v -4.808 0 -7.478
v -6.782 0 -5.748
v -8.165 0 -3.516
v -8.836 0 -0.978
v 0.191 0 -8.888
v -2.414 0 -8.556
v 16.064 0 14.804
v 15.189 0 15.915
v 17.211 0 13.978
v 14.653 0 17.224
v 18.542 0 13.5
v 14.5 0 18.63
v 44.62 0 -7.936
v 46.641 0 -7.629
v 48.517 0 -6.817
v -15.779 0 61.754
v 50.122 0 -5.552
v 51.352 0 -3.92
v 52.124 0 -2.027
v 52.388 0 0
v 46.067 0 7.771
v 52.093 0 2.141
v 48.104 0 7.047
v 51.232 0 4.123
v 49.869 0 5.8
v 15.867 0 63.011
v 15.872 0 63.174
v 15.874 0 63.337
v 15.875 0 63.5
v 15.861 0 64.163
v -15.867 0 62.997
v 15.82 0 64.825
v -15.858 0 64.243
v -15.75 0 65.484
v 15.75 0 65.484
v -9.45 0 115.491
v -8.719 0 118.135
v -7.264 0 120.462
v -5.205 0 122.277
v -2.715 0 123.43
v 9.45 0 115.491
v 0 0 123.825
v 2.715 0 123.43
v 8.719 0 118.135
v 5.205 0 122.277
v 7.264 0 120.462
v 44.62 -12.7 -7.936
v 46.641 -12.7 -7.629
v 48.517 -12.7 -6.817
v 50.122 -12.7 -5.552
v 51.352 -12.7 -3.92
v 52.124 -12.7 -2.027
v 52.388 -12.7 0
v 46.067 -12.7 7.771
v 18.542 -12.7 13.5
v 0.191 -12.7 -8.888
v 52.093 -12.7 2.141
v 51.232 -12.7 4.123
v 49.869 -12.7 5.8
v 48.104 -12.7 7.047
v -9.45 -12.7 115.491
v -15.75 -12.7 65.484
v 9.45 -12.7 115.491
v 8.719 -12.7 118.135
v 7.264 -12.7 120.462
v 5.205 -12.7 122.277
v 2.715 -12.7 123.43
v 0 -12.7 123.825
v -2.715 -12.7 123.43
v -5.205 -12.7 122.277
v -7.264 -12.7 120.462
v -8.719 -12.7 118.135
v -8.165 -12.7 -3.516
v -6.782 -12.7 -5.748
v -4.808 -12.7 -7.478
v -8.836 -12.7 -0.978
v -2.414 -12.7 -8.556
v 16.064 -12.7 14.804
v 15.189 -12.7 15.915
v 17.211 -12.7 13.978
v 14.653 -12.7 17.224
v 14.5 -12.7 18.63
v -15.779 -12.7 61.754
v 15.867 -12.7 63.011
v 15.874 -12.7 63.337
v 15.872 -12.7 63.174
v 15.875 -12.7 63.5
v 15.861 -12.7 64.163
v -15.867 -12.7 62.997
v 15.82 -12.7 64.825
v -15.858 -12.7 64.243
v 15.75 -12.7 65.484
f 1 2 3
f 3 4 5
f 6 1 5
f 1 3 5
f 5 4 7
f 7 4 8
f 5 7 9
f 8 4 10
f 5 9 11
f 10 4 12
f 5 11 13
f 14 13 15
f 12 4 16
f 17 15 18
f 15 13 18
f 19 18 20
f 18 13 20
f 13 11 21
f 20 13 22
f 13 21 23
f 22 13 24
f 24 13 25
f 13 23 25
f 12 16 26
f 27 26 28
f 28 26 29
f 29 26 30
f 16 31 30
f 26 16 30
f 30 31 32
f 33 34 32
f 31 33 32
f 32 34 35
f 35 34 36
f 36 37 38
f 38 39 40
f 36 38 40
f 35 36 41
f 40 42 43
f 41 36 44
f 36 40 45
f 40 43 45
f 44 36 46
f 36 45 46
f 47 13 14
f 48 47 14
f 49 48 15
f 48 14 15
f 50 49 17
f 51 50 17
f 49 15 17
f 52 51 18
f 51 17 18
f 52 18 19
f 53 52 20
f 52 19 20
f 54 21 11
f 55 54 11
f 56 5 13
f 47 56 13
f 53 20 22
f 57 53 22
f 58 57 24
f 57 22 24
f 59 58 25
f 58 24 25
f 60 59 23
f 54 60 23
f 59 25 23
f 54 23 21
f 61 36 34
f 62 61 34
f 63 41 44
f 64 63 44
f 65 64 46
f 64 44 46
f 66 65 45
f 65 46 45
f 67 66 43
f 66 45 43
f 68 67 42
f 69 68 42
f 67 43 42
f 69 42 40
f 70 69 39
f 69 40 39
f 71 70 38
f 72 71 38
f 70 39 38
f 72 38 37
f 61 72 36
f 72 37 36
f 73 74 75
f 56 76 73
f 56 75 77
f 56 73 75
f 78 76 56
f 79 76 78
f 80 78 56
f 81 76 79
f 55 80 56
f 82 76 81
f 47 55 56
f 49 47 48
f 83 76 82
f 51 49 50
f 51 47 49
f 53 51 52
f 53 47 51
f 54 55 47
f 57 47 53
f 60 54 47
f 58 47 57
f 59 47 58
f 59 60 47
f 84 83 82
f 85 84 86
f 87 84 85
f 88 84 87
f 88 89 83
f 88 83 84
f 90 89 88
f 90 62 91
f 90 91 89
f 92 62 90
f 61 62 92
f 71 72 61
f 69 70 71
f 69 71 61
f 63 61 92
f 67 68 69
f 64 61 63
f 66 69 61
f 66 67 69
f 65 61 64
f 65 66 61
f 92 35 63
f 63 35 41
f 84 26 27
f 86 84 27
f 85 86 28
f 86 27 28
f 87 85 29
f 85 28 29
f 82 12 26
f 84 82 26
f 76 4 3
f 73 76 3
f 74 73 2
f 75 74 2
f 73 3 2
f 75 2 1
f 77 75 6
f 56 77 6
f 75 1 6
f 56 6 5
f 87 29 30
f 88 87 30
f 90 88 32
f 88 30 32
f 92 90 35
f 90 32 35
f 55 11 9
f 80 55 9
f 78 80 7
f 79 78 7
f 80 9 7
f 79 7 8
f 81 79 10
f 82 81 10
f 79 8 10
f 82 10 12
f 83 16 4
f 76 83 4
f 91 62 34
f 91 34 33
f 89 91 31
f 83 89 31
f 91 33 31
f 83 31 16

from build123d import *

# Parameters (mm, degrees)
F2_DEPTH = 12.7


with BuildPart() as f2:
    # F0 (on Front) → F2 (new body)
    with BuildSketch(Plane.XZ):
        with BuildLine():
            ThreePointArc((-9.450293, 115.490625), (-0.596483, 104.793695), (9.525, 114.3))
            ThreePointArc((9.525, 114.3), (9.506305, 114.896483), (9.450293, 115.490625))
            ThreePointArc((9.450293, 115.490625), (0, 123.825), (-9.450293, 115.490625))
        make_face()
        with BuildLine():
            ThreePointArc((9.450293, 115.490625), (9.506305, 114.896483), (9.525, 114.3))
            ThreePointArc((9.525, 114.3), (-0.596483, 104.793695), (-9.450293, 115.490625))
            Line((-9.450293, 115.490625), (-15.750488, 65.484375))
            ThreePointArc((-15.750488, 65.484375), (0, 79.375), (15.750488, 65.484375))
            Line((15.750488, 65.484375), (9.450293, 115.490625))
        make_face()
        with BuildLine():
            ThreePointArc((15.875, 63.5), (15.843841, 64.494139), (15.750488, 65.484375))
            ThreePointArc((15.750488, 65.484375), (0, 79.375), (-15.750488, 65.484375))
            ThreePointArc((-15.750488, 65.484375), (-15.874547, 63.619893), (-15.778664, 61.75375))
            ThreePointArc((-15.778664, 61.75375), (0.630191, 47.637513), (15.867467, 63.011))
            ThreePointArc((15.867467, 63.011), (15.873117, 63.255471), (15.875, 63.5))
        make_face()
        with BuildLine():
            ThreePointArc((15.867467, 63.011), (0.630191, 47.637513), (-15.778664, 61.75375))
            Line((-15.778664, 61.75375), (-8.836052, -0.9779))
            ThreePointArc((-8.836052, -0.9779), (-0.489693, 8.876503), (8.89, 0))
            ThreePointArc((8.89, 0), (6.353174, -6.218463), (0.1905, -8.887959))
            Line((0.1905, -8.887959), (44.620089, -7.935677))
            ThreePointArc((44.620089, -7.935677), (36.545983, 0.728304), (46.067357, 7.770976))
            Line((46.067357, 7.770976), (18.542212, 13.499725))
            ThreePointArc((18.542212, 13.499725), (15.587302, 15.328925), (14.499731, 18.62963))
            Line((14.499731, 18.62963), (15.867467, 63.011))
        make_face()
        with BuildLine():
            ThreePointArc((8.89, 0), (-0.489693, 8.876503), (-8.836052, -0.9779))
            ThreePointArc((-8.836052, -0.9779), (-5.859066, -6.686064), (0.1905, -8.887959))
            ThreePointArc((0.1905, -8.887959), (6.353174, -6.218463), (8.89, 0))
        make_face()
        with BuildLine():
            ThreePointArc((46.067357, 7.770976), (36.545983, 0.728304), (44.620089, -7.935677))
            ThreePointArc((44.620089, -7.935677), (50.122477, -5.552199), (52.3875, 0))
            ThreePointArc((52.3875, 0), (50.60799, 5.0083), (46.067357, 7.770976))
        make_face()
    extrude(amount=F2_DEPTH)


solid = f2.part
